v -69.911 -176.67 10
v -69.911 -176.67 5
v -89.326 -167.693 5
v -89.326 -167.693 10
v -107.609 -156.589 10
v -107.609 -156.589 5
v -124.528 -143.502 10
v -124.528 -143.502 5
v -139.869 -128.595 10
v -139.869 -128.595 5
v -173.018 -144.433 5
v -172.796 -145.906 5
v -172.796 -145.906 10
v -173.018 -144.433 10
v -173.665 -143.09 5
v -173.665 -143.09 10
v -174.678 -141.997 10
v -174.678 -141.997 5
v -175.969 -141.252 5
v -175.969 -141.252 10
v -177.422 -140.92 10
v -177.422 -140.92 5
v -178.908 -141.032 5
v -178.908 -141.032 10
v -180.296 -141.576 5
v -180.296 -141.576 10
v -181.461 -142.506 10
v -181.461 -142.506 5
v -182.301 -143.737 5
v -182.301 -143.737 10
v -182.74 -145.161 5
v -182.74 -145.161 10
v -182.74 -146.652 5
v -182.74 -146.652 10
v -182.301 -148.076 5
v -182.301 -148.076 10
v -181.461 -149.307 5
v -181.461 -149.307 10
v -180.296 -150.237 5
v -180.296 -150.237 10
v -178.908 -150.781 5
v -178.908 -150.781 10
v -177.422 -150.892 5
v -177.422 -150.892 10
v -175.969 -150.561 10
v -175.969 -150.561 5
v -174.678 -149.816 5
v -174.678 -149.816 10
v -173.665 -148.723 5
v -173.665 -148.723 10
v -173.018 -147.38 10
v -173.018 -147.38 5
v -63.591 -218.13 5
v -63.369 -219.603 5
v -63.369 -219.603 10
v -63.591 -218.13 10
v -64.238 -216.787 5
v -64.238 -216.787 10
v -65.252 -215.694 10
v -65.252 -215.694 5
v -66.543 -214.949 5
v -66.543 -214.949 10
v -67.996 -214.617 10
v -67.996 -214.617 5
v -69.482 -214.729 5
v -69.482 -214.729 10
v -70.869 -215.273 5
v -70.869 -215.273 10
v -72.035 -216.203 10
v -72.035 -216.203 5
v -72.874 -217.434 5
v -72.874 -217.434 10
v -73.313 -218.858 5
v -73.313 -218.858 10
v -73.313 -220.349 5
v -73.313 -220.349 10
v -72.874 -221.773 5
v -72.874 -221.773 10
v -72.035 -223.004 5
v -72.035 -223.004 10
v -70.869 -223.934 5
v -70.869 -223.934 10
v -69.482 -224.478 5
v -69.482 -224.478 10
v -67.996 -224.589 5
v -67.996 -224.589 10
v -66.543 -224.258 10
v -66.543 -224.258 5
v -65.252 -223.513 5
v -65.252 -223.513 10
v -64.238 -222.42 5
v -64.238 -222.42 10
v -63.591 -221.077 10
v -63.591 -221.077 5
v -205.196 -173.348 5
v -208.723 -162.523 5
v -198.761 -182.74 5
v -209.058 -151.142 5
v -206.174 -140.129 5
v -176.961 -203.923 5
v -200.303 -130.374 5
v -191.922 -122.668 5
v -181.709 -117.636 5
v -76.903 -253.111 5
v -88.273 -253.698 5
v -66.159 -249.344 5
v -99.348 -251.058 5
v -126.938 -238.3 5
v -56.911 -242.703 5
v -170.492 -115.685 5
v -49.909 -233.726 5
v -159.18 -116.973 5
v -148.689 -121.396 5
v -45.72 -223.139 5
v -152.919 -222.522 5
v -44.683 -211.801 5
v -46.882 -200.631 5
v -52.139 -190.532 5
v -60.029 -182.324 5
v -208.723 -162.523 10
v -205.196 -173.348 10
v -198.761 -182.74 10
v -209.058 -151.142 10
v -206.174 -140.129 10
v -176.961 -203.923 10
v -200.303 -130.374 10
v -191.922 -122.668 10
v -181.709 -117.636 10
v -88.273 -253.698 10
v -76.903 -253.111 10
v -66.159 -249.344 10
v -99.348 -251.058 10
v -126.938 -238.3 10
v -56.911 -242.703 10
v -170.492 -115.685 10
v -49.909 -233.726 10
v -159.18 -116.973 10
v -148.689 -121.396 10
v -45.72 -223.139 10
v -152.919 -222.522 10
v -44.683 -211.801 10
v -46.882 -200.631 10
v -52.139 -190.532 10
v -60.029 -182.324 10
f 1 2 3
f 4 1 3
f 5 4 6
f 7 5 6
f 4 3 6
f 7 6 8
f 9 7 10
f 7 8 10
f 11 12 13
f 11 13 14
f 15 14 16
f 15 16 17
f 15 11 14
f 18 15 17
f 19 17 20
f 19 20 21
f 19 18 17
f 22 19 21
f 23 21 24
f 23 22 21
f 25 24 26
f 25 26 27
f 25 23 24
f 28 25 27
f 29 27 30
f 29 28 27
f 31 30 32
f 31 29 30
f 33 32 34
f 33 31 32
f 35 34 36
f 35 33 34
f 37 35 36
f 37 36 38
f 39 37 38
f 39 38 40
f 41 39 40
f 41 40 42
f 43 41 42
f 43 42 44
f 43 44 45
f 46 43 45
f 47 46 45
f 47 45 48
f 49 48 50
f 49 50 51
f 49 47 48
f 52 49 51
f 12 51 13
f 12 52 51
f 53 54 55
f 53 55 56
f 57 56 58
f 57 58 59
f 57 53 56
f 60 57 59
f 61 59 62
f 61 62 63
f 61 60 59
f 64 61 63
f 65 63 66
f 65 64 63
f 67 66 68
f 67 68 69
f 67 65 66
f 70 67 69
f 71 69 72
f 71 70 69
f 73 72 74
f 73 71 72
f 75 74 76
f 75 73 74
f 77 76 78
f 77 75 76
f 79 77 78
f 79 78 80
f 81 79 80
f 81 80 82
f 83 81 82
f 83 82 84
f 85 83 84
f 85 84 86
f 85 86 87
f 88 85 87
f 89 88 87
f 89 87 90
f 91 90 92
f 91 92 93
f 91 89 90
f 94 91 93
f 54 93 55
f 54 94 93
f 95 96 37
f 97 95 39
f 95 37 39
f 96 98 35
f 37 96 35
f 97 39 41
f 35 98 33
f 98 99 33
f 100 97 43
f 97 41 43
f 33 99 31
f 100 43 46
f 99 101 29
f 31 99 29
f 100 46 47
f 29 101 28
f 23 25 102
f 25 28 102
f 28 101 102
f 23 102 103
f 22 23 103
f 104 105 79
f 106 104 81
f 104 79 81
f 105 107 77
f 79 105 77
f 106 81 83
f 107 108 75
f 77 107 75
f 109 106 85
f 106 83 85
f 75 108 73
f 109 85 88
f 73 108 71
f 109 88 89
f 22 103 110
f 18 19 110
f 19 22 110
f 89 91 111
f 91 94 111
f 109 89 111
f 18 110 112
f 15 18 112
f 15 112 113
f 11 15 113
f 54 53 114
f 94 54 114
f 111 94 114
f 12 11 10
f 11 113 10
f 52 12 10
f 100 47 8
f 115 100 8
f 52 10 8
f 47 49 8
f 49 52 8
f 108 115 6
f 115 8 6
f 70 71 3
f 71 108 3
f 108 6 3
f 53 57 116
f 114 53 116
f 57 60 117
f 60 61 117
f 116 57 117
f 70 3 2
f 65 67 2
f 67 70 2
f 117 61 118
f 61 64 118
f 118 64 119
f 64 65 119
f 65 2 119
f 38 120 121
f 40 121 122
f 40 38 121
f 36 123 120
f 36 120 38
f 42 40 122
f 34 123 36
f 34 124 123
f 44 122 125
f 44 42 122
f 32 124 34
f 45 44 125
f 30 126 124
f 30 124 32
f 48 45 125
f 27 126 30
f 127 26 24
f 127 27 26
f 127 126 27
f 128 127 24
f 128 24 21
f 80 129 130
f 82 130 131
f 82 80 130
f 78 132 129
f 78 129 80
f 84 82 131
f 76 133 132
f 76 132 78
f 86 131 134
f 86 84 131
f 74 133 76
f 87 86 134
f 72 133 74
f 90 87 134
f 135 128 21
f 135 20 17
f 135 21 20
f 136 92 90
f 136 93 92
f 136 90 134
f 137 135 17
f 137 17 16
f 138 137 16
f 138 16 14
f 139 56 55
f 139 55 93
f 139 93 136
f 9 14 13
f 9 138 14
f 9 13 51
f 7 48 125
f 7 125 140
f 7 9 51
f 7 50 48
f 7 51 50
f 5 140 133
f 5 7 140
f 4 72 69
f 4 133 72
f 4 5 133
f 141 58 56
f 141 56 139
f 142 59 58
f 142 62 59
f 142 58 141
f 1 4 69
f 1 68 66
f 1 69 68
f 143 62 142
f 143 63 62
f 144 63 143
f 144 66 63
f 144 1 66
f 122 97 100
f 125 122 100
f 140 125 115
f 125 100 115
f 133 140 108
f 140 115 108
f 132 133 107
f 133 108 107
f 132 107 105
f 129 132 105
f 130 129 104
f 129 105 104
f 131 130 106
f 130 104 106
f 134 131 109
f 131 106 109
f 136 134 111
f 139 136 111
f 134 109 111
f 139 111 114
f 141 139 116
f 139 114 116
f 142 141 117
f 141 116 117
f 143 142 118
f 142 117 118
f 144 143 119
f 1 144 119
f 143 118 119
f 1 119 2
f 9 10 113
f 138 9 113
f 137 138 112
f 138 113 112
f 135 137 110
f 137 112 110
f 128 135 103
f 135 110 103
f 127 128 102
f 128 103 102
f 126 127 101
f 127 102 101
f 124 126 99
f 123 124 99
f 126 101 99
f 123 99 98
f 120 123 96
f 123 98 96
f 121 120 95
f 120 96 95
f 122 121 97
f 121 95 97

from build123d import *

# Parameters (mm, degrees)
F0_W     = 169.7224378586
F0_H     = 29.1480664164
F1_DEPTH = 5
F2_R     = 5
F3_DEPTH = 5.001
F6_R     = 5
F7_DEPTH = 5


# Not quite as in the source:
# - a feature of the source that left no trace in its solid (it failed there, or was rolled back) is left out


with BuildPart() as f1:
    # F0 (on Top) → F1 (new body)
    with BuildSketch(Plane.XY):
        with Locations((-209.8612189293, 14.5740332082)):
            Rectangle(F0_W, F0_H)
        Polygon((125, -249.6209740639), (125, -125), (-125, -125), (-125, 0), (-294.7224378586, 0), (-294.7224378586, -249.6209740639), align=None)
        Polygon((124.7859969735, -298.5799014568), (125, -249.6209740639), (-294.7224378586, -249.6209740639), (-294.7224378586, -298.5799014568), align=None)
    extrude(amount=F1_DEPTH)

    # F2 (on face) → F3 (cut, through all)
    with BuildSketch(Plane.XY.offset(5)):
        with Locations((-228.7230412454, -24.2026941362)):
            Circle(F2_R)
        with Locations((-219.7715429866, -67.8267564705)):
            Circle(F2_R)
        with Locations((-202.5809461153, -108.9080358424)):
            Circle(F2_R)
        with Locations((-177.7957154285, -145.9064206102)):
            Circle(F2_R)
        with Locations((-146.3450338267, -177.4348643144)):
            Circle(F2_R)
        with Locations((-109.4079678244, -202.3113851876)):
            Circle(F2_R)
        with Locations((-68.3692650785, -219.6033779172)):
            Circle(F2_R)
        with Locations((-24.7674410595, -228.6625764382)):
            Circle(F2_R)
        with Locations((19.7628989378, -229.1493570263)):
            Circle(F2_R)
        with Locations((63.5523401318, -221.0454705796)):
            Circle(F2_R)
    extrude(amount=-F3_DEPTH, mode=Mode.SUBTRACT)


with BuildPart() as f7:
    # F6 (on face) → F7 (new body)
    with BuildSketch(Plane.XY.offset(5)):
        with BuildLine():
            ThreePointArc((-44.6295934942, -213.8640500528), (-51.5484234193, -191.3776944906), (-69.9114028179, -176.6703024168))
            ThreePointArc((-69.9114028179, -176.6703024168), (-121.8233411216, -199.1458593545), (-99.3477842144, -251.0577976715))
            ThreePointArc((-99.3477842144, -251.0577976715), (-62.1432379515, -246.945220141), (-44.6295934942, -213.8640500528))
        make_face()
        with Locations((-109.4079678244, -202.3113851876)):
            Circle(F6_R, mode=Mode.SUBTRACT)
        with Locations((-68.3692650785, -219.6033779172)):
            Circle(F6_R, mode=Mode.SUBTRACT)
        with BuildLine():
            ThreePointArc((-139.8690317235, -128.5949220021), (-132.0468964749, -141.1390217828), (-129.3151434854, -155.6675373561))
            ThreePointArc((-129.3151434854, -155.6675373561), (-154.7866291142, -192.9357848352), (-198.7612569937, -182.7401508106))
            ThreePointArc((-198.7612569937, -182.7401508106), (-152.9185251389, -222.5217397679), (-99.3477842144, -251.0577976715))
            ThreePointArc((-99.3477842144, -251.0577976715), (-121.8233411216, -199.1458593545), (-69.9114028179, -176.6703024168))
            ThreePointArc((-69.9114028179, -176.6703024168), (-107.6093315173, -156.5893731081), (-139.8690317235, -128.5949220021))
        make_face()
        with BuildLine():
            ThreePointArc((-198.7612569937, -182.7401508106), (-154.7866291142, -192.9357848352), (-129.3151434854, -155.6675373561))
            ThreePointArc((-129.3151434854, -155.6675373561), (-132.0468964749, -141.1390217828), (-139.8690317235, -128.5949220021))
            ThreePointArc((-139.8690317235, -128.5949220021), (-196.3877578897, -126.221424721), (-198.7612569937, -182.7401508106))
        make_face()
        with Locations((-146.3450338267, -177.4348643144)):
            Circle(F6_R, mode=Mode.SUBTRACT)
        with Locations((-177.7957154285, -145.9064206102)):
            Circle(F6_R, mode=Mode.SUBTRACT)
        with Locations((-109.4079678244, -202.3113851876)):
            Circle(F6_R)
        with Locations((-146.3450338267, -177.4348643144)):
            Circle(F6_R)
    extrude(amount=F7_DEPTH)


solid = f7.part
